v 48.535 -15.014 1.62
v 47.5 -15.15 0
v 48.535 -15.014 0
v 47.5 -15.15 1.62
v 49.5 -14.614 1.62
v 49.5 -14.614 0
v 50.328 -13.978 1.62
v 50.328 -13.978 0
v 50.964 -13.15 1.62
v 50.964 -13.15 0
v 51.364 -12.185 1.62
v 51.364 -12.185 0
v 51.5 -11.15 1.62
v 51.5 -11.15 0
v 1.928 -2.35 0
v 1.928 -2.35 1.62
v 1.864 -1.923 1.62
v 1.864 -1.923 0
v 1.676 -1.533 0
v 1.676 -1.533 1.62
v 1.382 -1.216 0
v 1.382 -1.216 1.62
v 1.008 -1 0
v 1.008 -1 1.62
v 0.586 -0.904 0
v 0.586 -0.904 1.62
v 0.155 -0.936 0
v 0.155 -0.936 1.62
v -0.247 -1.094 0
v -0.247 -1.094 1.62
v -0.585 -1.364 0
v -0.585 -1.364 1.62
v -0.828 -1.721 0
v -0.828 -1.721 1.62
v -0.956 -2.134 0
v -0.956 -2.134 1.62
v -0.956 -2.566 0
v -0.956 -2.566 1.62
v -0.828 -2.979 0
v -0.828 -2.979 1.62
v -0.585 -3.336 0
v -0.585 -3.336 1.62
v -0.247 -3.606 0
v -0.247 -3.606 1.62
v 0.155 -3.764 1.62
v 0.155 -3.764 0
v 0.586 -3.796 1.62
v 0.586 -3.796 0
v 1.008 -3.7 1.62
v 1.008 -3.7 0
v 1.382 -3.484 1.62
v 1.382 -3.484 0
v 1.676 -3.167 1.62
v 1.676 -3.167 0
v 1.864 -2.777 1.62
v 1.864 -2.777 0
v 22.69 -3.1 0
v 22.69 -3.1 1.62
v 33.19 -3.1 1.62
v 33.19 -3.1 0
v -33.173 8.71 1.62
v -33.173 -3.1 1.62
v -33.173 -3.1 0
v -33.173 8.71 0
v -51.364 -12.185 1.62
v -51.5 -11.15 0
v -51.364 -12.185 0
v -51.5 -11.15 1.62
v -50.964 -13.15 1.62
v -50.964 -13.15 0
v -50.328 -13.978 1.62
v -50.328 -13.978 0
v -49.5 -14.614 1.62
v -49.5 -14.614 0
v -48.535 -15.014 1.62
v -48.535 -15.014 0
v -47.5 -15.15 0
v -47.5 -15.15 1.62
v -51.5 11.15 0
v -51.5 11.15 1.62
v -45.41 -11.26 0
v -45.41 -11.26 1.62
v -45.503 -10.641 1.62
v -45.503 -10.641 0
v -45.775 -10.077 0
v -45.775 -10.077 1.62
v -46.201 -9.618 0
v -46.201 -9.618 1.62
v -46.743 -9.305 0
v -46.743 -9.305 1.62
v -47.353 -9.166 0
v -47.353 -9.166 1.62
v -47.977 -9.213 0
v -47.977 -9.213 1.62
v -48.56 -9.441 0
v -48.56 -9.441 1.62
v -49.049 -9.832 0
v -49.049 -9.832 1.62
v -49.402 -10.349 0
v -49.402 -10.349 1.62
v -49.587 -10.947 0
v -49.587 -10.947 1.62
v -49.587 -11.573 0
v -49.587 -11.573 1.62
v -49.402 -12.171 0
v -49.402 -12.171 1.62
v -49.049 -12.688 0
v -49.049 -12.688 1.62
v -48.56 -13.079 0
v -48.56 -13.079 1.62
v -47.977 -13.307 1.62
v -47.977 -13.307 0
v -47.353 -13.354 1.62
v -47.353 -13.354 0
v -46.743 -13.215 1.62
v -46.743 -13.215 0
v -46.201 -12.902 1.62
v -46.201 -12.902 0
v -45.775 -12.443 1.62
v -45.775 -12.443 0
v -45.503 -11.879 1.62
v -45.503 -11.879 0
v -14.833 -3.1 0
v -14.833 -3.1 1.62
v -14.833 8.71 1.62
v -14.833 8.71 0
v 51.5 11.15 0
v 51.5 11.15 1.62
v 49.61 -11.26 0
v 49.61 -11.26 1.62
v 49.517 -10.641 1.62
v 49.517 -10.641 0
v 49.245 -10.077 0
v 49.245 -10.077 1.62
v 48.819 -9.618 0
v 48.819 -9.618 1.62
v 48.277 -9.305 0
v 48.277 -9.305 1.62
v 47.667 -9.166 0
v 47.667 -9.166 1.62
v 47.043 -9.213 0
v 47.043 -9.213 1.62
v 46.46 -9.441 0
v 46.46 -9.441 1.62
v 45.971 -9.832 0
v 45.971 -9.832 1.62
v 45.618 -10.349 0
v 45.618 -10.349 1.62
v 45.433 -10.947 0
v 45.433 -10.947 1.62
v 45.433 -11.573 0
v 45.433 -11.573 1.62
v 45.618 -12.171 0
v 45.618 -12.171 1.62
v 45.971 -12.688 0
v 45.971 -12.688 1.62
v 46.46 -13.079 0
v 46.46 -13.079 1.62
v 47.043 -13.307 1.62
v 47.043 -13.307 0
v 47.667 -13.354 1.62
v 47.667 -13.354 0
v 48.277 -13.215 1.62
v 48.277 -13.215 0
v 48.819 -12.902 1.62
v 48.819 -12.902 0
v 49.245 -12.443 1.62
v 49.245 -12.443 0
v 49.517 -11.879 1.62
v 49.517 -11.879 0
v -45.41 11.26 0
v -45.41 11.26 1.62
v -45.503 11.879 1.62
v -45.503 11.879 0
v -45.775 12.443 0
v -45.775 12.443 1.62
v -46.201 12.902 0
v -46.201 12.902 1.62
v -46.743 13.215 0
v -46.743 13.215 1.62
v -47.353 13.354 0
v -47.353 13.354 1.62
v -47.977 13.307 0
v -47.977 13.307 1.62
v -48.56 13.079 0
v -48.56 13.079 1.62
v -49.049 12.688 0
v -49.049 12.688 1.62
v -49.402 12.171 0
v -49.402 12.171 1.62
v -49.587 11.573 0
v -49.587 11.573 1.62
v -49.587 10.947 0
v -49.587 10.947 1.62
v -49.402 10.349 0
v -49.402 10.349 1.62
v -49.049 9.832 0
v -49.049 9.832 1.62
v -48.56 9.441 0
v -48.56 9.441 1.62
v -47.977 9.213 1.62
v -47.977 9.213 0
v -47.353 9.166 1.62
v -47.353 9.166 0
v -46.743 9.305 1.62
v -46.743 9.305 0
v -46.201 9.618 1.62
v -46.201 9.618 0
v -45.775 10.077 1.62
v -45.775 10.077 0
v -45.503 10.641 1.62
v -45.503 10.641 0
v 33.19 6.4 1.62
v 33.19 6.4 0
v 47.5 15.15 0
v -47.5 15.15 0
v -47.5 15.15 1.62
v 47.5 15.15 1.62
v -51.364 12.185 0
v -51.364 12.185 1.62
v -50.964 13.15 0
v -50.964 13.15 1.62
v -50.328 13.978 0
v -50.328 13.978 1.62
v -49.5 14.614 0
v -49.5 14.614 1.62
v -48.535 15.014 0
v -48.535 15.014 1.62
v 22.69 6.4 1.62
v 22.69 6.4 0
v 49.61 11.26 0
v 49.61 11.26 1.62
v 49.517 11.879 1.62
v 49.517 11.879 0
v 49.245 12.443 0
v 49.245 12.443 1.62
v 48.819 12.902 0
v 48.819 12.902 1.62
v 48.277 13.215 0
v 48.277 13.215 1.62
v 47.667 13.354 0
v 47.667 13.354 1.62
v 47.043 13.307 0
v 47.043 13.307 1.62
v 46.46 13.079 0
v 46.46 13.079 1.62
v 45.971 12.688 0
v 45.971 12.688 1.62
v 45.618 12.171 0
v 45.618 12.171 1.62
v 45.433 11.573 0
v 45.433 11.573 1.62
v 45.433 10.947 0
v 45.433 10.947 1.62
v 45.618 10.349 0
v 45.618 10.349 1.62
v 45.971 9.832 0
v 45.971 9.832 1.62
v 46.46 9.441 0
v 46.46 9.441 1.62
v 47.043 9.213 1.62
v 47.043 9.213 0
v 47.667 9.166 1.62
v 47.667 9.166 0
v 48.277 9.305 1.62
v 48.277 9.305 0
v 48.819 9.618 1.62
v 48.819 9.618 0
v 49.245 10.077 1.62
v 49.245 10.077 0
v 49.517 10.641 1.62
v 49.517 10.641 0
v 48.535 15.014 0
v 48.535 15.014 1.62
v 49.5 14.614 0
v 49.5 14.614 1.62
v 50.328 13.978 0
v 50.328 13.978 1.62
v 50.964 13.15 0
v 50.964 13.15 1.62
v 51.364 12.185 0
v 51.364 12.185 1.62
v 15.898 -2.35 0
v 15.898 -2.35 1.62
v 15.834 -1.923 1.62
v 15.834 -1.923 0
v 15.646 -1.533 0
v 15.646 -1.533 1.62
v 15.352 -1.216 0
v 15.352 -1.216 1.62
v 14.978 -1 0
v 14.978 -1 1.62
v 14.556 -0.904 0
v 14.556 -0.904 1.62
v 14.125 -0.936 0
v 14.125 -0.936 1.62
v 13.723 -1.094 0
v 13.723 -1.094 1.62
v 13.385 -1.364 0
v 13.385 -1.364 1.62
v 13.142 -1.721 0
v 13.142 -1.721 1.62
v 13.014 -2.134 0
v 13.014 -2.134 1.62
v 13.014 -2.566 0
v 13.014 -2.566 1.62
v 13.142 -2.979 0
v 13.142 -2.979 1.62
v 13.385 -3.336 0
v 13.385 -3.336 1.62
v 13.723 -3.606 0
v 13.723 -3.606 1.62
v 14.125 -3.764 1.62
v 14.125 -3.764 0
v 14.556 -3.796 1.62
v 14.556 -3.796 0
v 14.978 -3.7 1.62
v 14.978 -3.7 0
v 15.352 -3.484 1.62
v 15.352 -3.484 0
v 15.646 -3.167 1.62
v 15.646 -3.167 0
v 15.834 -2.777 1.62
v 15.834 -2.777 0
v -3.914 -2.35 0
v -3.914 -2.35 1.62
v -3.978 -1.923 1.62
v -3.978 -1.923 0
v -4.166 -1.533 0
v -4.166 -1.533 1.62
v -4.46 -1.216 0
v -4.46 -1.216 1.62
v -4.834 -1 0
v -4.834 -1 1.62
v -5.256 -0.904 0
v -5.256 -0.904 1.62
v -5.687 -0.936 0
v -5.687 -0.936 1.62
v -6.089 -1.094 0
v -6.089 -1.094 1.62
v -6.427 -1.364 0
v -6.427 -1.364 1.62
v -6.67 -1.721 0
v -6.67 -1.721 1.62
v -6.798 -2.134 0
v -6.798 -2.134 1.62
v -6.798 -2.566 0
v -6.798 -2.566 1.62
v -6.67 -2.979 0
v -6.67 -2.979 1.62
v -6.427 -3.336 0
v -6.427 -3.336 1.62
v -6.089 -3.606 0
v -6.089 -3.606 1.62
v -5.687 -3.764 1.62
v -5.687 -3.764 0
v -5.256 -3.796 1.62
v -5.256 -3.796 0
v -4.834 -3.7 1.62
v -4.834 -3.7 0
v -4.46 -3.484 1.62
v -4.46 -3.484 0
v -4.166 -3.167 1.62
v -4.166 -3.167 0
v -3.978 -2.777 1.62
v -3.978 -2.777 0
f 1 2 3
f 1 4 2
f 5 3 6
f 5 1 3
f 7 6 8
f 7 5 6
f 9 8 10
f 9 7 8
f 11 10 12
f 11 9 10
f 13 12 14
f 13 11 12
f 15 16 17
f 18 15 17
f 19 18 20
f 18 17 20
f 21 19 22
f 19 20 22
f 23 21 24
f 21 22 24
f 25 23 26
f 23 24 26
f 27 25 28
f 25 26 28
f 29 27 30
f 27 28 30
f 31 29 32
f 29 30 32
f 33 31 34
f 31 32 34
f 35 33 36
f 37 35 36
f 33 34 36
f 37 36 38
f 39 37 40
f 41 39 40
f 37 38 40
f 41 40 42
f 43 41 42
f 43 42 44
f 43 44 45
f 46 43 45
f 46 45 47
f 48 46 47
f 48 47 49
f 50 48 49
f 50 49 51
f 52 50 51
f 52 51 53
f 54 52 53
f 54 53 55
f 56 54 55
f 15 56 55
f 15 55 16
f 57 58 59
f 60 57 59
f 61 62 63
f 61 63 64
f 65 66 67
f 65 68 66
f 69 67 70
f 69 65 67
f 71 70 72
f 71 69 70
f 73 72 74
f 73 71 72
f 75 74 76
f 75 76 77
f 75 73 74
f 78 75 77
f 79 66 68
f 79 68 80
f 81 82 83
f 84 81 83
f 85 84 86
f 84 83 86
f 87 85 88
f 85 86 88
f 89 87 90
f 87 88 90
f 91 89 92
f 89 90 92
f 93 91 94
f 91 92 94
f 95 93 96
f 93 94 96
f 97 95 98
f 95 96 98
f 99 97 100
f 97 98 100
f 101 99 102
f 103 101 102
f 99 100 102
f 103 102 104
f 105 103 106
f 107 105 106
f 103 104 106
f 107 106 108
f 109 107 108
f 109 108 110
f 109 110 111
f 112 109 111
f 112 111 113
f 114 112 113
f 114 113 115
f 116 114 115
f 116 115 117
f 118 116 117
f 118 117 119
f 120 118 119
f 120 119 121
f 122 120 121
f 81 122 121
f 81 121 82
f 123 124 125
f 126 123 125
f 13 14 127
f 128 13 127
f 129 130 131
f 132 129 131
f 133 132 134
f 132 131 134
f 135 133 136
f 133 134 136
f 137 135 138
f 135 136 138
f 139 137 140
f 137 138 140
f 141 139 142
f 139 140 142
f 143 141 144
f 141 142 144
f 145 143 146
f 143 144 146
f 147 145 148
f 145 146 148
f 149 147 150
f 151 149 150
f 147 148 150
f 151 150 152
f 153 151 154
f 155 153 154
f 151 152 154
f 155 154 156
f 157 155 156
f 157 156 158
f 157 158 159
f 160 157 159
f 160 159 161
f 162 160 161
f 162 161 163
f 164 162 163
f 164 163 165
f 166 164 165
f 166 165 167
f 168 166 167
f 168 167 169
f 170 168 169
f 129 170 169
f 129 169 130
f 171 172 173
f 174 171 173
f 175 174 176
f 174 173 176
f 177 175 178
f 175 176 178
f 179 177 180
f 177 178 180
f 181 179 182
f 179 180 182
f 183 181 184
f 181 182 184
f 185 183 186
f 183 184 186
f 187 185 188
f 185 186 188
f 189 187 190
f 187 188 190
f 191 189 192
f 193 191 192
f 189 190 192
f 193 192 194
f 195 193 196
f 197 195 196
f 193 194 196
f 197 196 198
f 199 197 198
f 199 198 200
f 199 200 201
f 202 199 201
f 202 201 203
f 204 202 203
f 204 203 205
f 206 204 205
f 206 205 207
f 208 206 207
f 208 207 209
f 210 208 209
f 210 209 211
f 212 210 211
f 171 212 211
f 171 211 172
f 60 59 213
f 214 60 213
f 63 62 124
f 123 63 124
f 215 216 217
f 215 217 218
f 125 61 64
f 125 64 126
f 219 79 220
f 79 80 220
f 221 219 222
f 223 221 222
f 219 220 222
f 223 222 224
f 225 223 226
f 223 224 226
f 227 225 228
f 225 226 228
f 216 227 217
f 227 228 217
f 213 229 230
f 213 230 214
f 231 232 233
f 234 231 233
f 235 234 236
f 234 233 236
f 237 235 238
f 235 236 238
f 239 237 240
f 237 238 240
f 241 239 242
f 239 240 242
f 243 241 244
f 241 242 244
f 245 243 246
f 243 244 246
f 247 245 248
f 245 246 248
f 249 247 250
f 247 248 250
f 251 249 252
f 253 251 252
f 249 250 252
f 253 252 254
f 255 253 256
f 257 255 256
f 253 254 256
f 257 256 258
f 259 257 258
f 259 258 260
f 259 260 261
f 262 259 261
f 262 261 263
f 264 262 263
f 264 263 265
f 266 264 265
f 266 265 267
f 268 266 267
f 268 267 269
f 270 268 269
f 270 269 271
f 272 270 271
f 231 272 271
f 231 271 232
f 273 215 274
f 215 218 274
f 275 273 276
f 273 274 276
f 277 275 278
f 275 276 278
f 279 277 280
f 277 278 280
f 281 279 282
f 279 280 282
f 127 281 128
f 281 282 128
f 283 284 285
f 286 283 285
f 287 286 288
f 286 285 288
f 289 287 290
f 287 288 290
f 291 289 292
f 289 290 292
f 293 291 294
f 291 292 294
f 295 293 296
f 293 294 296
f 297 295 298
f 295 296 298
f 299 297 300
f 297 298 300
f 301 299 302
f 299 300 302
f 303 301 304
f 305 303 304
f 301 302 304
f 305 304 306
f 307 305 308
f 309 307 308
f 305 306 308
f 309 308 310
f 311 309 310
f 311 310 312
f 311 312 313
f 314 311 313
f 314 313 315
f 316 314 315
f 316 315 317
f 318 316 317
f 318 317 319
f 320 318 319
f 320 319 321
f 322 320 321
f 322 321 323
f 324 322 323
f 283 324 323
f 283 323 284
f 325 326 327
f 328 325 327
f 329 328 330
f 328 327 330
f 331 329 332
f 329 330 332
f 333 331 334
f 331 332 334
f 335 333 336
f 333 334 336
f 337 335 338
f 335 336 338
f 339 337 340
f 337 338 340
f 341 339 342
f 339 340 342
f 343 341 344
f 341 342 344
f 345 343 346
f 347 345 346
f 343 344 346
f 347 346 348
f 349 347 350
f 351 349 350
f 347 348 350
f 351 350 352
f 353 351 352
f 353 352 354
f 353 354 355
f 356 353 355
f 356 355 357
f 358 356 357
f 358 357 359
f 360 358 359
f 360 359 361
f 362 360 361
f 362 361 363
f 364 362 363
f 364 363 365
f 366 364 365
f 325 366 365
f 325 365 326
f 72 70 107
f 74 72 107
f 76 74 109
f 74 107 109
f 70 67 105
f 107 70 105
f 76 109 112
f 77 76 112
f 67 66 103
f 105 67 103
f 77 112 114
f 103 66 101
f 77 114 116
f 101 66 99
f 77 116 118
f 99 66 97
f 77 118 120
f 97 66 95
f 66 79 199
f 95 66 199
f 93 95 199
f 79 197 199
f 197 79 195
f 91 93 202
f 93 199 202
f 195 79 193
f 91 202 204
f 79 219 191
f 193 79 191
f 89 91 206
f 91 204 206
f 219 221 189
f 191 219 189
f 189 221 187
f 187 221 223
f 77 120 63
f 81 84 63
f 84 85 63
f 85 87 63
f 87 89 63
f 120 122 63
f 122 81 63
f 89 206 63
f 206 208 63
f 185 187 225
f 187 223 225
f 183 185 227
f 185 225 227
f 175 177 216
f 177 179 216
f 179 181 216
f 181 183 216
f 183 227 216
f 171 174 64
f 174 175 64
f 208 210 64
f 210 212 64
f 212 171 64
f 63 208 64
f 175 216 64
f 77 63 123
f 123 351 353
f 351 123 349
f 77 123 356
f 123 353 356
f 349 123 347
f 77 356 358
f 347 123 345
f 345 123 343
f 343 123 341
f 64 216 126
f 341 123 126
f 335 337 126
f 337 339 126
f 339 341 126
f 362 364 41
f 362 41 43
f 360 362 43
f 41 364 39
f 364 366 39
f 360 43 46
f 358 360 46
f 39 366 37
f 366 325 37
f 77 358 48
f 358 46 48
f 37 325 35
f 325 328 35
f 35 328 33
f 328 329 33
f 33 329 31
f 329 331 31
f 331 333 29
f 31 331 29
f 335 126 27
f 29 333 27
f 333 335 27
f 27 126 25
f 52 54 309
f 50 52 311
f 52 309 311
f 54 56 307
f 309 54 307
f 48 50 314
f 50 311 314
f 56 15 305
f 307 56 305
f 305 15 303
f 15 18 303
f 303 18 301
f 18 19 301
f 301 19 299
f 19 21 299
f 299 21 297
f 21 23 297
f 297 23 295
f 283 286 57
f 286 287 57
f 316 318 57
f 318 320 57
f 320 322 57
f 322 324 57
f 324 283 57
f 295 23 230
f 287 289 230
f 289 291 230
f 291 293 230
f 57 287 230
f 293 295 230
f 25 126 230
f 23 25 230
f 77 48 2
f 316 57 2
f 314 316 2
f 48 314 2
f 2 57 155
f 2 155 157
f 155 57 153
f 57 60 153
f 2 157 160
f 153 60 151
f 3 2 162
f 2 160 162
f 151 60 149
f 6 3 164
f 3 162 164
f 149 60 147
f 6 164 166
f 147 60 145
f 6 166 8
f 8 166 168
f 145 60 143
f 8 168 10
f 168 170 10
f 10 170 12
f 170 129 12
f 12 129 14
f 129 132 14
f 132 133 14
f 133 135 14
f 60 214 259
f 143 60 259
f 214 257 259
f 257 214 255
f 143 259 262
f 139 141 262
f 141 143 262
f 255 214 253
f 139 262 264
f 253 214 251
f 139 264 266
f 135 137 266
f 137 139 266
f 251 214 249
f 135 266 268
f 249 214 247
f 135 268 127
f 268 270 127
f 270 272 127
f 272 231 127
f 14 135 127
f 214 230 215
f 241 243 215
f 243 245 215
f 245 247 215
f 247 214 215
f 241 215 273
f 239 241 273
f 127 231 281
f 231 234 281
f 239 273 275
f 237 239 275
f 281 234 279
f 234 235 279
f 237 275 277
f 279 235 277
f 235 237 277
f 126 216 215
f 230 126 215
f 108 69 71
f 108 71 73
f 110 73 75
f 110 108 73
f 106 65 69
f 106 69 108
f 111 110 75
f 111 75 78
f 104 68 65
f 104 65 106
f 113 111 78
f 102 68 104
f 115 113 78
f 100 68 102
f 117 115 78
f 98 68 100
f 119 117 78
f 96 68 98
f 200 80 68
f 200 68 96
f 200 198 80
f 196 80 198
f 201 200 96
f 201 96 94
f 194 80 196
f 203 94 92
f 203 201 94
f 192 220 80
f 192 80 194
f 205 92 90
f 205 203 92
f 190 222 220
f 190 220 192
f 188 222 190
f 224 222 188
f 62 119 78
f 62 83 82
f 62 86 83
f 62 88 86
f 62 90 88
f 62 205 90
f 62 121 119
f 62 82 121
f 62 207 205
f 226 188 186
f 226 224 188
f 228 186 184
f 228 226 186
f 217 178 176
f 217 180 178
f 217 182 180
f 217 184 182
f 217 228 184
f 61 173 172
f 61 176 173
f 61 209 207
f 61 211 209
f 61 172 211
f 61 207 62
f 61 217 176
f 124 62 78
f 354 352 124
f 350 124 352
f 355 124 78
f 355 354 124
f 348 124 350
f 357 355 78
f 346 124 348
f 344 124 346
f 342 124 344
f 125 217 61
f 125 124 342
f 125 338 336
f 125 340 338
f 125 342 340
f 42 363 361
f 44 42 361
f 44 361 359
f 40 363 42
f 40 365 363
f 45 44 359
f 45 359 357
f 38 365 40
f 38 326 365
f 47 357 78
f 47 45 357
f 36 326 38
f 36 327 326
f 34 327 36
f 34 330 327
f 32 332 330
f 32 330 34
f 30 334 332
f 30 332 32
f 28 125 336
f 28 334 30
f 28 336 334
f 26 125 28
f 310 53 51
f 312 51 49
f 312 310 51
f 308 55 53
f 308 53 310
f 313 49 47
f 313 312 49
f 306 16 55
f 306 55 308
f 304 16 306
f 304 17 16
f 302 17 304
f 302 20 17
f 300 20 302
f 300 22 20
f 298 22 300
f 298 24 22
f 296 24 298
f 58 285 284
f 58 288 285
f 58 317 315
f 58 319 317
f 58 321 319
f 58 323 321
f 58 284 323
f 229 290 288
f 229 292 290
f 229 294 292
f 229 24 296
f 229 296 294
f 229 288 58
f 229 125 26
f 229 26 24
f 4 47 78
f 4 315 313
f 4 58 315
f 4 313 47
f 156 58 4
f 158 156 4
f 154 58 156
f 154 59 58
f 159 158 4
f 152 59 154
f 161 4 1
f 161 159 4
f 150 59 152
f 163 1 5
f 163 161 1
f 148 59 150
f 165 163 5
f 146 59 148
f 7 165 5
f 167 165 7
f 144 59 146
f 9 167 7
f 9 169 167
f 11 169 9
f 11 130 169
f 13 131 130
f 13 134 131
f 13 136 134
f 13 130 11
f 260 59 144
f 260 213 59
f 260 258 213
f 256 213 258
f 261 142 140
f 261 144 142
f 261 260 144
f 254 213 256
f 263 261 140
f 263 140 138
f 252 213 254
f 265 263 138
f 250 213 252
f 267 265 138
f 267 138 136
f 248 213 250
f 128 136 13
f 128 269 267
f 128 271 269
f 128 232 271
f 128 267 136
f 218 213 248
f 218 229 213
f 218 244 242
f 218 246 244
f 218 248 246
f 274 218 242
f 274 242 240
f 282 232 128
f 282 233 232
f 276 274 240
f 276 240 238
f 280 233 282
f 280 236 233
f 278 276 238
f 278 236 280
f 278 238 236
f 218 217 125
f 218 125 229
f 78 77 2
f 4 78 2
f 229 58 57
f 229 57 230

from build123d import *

# Parameters (mm, degrees)
SKETCH_W        = 103
SKETCH_H        = 30.3
PAD_DEPTH       = 1.62
SKETCH001_R     = 2.1
POCKET_DEPTH    = 5
SKETCH002_R     = 1.45
SKETCH002_W     = 18.34
SKETCH002_H     = 11.81
SKETCH002_W_2   = 10.5
SKETCH002_H_2   = 9.5
POCKET001_DEPTH = 5
FILLET_R        = 4


with BuildPart() as part:
    # Sketch → Pad (new body)
    with BuildSketch(Plane.XY):
        Rectangle(SKETCH_W, SKETCH_H)
    extrude(amount=PAD_DEPTH)

    # Sketch001 → Pocket (cut)
    with BuildSketch(Plane.XY.offset(1.62)):
        with Locations((-47.51, 11.26)):
            Circle(SKETCH001_R)
        with Locations((47.51, 11.26)):
            Circle(SKETCH001_R)
        with Locations((-47.51, -11.26)):
            Circle(SKETCH001_R)
        with Locations((47.51, -11.26)):
            Circle(SKETCH001_R)
    extrude(amount=-POCKET_DEPTH, mode=Mode.SUBTRACT)

    # Sketch002 → Pocket001 (cut)
    with BuildSketch(Plane.XY.offset(1.62)):
        with Locations((-5.364, -2.35)):
            Circle(SKETCH002_R)
        with Locations((0.478, -2.35)):
            Circle(SKETCH002_R)
        with Locations((14.448, -2.35)):
            Circle(SKETCH002_R)
        with Locations((-24.003, 2.805)):
            Rectangle(SKETCH002_W, SKETCH002_H)
        with Locations((27.94, 1.65)):
            Rectangle(SKETCH002_W_2, SKETCH002_H_2)
    extrude(amount=-POCKET001_DEPTH, mode=Mode.SUBTRACT)

    # Fillet
    fillet_edges = [part.edges().sort_by_distance(p)[0] for p in [
        (-51.5, -15.15, 0.81),
        (-51.5, 15.15, 0.81),
        (51.5, -15.15, 0.81),
        (51.5, 15.15, 0.81),
    ]]
    fillet(fillet_edges, radius=FILLET_R)


solid = part.part
